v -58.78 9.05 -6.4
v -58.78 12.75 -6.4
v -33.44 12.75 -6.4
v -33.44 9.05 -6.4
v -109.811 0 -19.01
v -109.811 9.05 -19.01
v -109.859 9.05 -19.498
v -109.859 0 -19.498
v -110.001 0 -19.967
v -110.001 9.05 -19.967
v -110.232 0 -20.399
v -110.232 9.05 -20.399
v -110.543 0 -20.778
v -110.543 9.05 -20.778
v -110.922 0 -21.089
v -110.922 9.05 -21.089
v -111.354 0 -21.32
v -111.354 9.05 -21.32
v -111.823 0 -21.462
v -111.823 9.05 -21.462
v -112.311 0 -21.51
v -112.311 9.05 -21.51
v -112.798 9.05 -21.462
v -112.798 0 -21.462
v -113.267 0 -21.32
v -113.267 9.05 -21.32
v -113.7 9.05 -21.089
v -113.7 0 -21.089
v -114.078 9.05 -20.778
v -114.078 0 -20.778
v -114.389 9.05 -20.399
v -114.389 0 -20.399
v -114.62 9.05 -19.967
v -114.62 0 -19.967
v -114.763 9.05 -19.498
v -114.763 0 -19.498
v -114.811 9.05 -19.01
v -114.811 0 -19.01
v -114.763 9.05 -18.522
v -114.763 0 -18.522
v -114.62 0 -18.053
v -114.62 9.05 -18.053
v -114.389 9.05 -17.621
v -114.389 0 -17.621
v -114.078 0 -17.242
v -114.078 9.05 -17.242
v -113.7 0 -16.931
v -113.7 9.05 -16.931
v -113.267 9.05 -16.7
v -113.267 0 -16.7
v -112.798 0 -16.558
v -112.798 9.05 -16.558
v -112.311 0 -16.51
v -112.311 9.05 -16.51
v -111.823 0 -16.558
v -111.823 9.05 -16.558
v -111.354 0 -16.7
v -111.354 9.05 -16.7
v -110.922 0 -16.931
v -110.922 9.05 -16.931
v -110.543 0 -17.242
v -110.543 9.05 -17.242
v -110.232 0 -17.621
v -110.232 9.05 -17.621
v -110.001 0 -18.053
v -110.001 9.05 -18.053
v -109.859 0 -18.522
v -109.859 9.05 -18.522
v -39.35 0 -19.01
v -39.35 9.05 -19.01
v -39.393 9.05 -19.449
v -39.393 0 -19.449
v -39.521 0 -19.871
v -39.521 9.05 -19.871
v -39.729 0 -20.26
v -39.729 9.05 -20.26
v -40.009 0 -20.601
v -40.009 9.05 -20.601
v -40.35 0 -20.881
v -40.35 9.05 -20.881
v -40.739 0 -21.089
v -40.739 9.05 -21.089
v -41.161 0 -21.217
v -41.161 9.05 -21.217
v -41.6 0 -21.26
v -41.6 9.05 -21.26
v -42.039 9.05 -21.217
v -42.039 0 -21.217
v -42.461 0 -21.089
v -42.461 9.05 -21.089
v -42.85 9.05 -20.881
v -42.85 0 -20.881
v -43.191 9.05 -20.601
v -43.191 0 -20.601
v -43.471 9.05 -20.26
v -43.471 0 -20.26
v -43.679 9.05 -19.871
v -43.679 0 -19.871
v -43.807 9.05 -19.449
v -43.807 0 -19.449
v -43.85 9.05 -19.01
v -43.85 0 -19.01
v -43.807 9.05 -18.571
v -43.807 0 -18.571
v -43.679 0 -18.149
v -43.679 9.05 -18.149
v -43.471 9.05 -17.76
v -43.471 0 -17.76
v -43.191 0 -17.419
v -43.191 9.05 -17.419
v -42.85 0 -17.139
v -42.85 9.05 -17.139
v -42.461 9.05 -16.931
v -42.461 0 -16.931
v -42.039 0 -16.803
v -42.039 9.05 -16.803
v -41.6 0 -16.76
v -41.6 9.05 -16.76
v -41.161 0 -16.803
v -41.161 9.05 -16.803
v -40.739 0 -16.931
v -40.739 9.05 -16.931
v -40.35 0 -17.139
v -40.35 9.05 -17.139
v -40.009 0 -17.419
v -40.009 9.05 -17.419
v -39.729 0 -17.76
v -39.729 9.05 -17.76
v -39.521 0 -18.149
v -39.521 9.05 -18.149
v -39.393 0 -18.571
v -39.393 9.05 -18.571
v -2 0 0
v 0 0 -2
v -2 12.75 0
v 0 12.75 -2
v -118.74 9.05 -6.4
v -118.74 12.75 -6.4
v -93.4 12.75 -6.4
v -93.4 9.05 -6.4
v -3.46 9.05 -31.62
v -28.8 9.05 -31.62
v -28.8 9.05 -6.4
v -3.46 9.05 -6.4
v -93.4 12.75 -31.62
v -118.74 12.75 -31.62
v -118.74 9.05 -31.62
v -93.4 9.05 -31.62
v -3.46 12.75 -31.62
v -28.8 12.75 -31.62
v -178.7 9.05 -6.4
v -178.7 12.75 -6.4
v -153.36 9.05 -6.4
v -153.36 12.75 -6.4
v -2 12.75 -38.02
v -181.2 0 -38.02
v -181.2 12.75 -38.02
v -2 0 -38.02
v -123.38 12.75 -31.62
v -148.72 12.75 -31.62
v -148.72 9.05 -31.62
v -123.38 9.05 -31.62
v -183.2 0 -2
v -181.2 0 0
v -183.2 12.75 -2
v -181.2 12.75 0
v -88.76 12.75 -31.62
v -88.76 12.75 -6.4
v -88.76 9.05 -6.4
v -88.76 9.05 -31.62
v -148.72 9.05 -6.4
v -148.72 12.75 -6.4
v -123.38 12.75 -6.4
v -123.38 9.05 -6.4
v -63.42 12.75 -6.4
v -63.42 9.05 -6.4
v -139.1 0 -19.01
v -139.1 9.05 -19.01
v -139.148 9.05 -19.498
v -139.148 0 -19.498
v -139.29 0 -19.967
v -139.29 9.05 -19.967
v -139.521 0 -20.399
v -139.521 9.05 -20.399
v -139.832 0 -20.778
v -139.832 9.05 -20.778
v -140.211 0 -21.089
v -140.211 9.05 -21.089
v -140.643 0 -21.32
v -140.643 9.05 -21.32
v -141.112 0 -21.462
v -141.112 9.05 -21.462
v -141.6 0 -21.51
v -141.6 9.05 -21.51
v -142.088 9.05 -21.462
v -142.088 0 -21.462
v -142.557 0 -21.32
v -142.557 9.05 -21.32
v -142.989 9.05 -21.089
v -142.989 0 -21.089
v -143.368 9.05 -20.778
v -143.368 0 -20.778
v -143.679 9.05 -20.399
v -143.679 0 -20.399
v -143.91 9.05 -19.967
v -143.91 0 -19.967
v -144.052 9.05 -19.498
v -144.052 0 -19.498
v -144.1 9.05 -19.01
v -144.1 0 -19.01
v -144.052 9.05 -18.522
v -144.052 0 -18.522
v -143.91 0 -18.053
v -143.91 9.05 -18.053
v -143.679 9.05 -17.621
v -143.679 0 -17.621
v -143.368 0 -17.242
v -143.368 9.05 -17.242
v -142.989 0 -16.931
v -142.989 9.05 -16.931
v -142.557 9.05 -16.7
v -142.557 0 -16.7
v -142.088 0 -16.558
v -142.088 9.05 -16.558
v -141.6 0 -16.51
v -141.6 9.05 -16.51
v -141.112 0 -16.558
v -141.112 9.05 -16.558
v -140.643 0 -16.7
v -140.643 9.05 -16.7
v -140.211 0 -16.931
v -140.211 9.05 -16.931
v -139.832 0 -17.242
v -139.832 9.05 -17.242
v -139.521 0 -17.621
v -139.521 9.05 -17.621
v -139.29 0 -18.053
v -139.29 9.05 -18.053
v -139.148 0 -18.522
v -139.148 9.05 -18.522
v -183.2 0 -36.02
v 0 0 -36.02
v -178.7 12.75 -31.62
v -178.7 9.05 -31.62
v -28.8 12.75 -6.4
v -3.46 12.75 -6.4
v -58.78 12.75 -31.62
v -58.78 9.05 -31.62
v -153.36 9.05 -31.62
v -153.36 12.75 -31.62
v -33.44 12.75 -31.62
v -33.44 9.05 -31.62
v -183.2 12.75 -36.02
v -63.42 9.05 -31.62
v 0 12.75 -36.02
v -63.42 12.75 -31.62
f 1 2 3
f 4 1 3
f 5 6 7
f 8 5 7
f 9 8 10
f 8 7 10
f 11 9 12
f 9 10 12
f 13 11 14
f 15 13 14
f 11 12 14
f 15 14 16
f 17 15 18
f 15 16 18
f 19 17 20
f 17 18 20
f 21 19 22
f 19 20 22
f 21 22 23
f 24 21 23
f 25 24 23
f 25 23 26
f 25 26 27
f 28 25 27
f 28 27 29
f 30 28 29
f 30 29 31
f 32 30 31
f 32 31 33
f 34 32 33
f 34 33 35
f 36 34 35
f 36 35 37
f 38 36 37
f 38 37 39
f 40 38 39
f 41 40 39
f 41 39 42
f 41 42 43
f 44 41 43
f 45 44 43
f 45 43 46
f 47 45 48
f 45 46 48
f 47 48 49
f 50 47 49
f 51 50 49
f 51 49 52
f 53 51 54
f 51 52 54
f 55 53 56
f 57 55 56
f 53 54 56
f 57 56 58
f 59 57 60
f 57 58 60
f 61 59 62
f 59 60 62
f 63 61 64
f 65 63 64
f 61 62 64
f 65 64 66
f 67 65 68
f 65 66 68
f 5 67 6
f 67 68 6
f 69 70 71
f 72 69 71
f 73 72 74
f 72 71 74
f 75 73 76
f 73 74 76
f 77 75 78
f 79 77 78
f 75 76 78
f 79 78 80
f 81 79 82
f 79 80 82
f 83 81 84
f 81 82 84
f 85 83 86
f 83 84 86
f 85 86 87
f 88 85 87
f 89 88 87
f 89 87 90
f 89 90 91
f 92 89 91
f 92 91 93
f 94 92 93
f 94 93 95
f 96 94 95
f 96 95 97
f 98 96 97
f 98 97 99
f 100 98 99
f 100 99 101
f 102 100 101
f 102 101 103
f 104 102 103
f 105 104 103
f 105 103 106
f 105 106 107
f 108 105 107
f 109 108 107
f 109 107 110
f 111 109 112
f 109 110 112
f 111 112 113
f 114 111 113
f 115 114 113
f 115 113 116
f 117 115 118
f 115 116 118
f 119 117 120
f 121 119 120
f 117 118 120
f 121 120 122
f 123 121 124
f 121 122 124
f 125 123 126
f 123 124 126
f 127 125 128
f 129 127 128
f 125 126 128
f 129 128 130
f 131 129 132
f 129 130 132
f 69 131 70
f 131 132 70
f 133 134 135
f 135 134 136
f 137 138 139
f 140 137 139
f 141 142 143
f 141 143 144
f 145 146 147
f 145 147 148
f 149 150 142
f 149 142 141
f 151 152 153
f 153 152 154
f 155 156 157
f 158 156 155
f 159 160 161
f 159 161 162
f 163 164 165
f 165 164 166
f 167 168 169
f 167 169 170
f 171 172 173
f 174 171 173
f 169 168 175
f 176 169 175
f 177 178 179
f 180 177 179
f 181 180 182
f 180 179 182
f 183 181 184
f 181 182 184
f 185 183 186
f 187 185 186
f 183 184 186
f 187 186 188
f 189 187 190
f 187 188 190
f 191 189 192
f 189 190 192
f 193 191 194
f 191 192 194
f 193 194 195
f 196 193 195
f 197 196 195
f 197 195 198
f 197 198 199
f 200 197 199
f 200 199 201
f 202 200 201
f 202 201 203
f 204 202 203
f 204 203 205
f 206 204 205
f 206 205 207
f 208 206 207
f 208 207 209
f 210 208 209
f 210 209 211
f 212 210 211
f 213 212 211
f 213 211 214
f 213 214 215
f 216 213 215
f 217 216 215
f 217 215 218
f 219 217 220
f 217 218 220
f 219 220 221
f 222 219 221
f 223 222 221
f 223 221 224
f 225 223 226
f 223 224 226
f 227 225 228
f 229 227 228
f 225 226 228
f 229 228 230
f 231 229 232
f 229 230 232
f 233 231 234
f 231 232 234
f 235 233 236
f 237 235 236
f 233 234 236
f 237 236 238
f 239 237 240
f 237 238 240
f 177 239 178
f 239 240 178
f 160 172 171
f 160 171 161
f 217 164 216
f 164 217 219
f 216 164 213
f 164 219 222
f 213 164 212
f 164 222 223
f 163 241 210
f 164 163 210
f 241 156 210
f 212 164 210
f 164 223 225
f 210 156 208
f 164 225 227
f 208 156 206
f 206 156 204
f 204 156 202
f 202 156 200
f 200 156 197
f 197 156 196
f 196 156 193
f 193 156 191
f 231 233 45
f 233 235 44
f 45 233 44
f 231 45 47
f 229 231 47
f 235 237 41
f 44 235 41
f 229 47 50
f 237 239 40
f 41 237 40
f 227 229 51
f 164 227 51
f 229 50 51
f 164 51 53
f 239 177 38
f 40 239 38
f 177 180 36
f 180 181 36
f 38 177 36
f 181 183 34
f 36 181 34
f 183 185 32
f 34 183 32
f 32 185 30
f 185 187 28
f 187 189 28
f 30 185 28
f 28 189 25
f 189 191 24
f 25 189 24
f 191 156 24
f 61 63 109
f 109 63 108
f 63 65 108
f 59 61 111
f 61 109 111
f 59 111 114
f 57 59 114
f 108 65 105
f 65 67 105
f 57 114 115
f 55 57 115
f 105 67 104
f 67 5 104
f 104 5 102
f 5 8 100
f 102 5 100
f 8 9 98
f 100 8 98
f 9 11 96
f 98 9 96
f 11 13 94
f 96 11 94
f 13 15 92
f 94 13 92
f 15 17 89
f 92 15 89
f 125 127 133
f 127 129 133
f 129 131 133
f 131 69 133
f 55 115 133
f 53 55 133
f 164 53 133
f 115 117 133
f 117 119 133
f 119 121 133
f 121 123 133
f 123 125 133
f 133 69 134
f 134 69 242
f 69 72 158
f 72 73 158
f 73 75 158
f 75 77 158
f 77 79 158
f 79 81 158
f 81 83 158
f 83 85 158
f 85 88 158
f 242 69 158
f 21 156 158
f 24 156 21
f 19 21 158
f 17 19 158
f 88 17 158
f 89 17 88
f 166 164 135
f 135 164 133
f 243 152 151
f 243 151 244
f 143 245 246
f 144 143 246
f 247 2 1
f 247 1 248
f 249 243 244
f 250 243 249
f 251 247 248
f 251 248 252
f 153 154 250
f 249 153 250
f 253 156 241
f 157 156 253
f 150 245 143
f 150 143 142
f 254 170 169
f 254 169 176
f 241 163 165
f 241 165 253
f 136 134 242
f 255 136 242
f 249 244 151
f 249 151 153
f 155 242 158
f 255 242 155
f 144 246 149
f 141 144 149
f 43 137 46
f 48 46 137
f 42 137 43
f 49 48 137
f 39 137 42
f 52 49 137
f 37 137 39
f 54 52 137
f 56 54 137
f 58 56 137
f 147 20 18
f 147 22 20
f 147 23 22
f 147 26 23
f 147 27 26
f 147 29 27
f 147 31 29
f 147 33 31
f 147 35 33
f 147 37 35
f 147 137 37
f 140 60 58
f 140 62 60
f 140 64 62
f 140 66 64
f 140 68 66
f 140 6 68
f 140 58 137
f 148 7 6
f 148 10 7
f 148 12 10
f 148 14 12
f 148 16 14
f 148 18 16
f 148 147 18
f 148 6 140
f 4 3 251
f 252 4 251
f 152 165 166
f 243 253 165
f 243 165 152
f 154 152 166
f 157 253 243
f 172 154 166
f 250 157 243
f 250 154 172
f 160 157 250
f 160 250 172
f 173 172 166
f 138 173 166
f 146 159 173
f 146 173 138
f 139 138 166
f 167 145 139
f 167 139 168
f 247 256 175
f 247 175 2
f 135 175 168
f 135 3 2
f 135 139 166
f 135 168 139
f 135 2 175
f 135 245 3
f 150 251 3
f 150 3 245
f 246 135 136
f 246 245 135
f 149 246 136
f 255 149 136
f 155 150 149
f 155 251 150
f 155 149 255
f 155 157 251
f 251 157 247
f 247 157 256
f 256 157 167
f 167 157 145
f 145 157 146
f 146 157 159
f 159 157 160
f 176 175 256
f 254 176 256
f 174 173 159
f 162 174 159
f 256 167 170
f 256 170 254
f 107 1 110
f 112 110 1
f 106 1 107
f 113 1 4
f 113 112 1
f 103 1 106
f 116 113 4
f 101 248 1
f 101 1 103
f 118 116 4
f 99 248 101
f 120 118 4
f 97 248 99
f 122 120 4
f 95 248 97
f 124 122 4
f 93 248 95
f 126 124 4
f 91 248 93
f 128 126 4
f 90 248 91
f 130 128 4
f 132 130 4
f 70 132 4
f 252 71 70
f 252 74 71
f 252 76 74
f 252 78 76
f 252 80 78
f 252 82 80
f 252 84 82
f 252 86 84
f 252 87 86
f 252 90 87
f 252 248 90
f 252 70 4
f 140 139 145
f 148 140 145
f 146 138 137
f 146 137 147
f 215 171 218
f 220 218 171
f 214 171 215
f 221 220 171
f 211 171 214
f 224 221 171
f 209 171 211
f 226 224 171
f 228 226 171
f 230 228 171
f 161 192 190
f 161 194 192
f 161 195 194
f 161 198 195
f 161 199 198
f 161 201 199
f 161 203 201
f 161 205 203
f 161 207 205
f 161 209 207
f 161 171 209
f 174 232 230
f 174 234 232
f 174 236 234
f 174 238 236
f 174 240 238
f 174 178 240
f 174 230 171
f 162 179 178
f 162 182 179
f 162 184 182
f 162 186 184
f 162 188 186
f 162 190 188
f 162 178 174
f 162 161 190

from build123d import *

# Parameters (mm, degrees)
ESBO_O1_W                = 183.2
ESBO_O1_H                = 38.02
RESSALTO_EXTRUS_O1_DEPTH = 12.75
ESBO_O3_W                = 25.34
ESBO_O3_H                = 25.22
CORTE_EXTRUS_O1_DEPTH    = 3.7
CHANFRO1_SIZE            = 2
ESBO_O4_R                = 2.25
ESBO_O4_R_2              = 2.5
CORTE_EXTRUS_O2_DEPTH    = 10100


with BuildPart() as part:
    # Esboço1 → Ressalto-extrusão1 (new body)
    with BuildSketch(Plane(origin=(0, 0, 0), x_dir=(1, 0, 0), z_dir=(0, 1, 0))):
        with Locations((-91.6, 19.01)):
            Rectangle(ESBO_O1_W, ESBO_O1_H)
    extrude(amount=RESSALTO_EXTRUS_O1_DEPTH)

    # Esboço3 → Corte-extrusão1 (cut)
    with BuildSketch(Plane(origin=(0, 12.75, 0), x_dir=(1, 0, 0), z_dir=(0, 1, 0))):
        with Locations((-166.03, 19.01)):
            Rectangle(ESBO_O3_W, ESBO_O3_H)
        with Locations((-136.05, 19.01)):
            Rectangle(ESBO_O3_W, ESBO_O3_H)
        with Locations((-106.07, 19.01)):
            Rectangle(ESBO_O3_W, ESBO_O3_H)
        with Locations((-76.09, 19.01)):
            Rectangle(ESBO_O3_W, ESBO_O3_H)
        with Locations((-46.11, 19.01)):
            Rectangle(ESBO_O3_W, ESBO_O3_H)
        with Locations((-16.13, 19.01)):
            Rectangle(ESBO_O3_W, ESBO_O3_H)
    extrude(amount=-CORTE_EXTRUS_O1_DEPTH, mode=Mode.SUBTRACT)

    # Chanfro1
    chanfro1_edges = [part.edges().sort_by_distance(p)[0] for p in [
        (0, 6.375, 0),
        (-183.2, 6.375, 0),
        (-183.2, 6.375, -38.02),
        (0, 6.375, -38.02),
    ]]
    chamfer(chanfro1_edges, length=CHANFRO1_SIZE)

    # Esboço4 → Corte-extrusão2 (cut)
    with BuildSketch(Plane(origin=(0, 12.75, 0), x_dir=(1, 0, 0), z_dir=(0, 1, 0))):
        with Locations((-41.6, 19.01)):
            Circle(ESBO_O4_R)
        with Locations((-141.6, 19.01)):
            Circle(ESBO_O4_R_2)
        with Locations((-112.310678119, 19.01)):
            Circle(ESBO_O4_R_2)
    extrude(amount=-CORTE_EXTRUS_O2_DEPTH, mode=Mode.SUBTRACT)


solid = part.part
